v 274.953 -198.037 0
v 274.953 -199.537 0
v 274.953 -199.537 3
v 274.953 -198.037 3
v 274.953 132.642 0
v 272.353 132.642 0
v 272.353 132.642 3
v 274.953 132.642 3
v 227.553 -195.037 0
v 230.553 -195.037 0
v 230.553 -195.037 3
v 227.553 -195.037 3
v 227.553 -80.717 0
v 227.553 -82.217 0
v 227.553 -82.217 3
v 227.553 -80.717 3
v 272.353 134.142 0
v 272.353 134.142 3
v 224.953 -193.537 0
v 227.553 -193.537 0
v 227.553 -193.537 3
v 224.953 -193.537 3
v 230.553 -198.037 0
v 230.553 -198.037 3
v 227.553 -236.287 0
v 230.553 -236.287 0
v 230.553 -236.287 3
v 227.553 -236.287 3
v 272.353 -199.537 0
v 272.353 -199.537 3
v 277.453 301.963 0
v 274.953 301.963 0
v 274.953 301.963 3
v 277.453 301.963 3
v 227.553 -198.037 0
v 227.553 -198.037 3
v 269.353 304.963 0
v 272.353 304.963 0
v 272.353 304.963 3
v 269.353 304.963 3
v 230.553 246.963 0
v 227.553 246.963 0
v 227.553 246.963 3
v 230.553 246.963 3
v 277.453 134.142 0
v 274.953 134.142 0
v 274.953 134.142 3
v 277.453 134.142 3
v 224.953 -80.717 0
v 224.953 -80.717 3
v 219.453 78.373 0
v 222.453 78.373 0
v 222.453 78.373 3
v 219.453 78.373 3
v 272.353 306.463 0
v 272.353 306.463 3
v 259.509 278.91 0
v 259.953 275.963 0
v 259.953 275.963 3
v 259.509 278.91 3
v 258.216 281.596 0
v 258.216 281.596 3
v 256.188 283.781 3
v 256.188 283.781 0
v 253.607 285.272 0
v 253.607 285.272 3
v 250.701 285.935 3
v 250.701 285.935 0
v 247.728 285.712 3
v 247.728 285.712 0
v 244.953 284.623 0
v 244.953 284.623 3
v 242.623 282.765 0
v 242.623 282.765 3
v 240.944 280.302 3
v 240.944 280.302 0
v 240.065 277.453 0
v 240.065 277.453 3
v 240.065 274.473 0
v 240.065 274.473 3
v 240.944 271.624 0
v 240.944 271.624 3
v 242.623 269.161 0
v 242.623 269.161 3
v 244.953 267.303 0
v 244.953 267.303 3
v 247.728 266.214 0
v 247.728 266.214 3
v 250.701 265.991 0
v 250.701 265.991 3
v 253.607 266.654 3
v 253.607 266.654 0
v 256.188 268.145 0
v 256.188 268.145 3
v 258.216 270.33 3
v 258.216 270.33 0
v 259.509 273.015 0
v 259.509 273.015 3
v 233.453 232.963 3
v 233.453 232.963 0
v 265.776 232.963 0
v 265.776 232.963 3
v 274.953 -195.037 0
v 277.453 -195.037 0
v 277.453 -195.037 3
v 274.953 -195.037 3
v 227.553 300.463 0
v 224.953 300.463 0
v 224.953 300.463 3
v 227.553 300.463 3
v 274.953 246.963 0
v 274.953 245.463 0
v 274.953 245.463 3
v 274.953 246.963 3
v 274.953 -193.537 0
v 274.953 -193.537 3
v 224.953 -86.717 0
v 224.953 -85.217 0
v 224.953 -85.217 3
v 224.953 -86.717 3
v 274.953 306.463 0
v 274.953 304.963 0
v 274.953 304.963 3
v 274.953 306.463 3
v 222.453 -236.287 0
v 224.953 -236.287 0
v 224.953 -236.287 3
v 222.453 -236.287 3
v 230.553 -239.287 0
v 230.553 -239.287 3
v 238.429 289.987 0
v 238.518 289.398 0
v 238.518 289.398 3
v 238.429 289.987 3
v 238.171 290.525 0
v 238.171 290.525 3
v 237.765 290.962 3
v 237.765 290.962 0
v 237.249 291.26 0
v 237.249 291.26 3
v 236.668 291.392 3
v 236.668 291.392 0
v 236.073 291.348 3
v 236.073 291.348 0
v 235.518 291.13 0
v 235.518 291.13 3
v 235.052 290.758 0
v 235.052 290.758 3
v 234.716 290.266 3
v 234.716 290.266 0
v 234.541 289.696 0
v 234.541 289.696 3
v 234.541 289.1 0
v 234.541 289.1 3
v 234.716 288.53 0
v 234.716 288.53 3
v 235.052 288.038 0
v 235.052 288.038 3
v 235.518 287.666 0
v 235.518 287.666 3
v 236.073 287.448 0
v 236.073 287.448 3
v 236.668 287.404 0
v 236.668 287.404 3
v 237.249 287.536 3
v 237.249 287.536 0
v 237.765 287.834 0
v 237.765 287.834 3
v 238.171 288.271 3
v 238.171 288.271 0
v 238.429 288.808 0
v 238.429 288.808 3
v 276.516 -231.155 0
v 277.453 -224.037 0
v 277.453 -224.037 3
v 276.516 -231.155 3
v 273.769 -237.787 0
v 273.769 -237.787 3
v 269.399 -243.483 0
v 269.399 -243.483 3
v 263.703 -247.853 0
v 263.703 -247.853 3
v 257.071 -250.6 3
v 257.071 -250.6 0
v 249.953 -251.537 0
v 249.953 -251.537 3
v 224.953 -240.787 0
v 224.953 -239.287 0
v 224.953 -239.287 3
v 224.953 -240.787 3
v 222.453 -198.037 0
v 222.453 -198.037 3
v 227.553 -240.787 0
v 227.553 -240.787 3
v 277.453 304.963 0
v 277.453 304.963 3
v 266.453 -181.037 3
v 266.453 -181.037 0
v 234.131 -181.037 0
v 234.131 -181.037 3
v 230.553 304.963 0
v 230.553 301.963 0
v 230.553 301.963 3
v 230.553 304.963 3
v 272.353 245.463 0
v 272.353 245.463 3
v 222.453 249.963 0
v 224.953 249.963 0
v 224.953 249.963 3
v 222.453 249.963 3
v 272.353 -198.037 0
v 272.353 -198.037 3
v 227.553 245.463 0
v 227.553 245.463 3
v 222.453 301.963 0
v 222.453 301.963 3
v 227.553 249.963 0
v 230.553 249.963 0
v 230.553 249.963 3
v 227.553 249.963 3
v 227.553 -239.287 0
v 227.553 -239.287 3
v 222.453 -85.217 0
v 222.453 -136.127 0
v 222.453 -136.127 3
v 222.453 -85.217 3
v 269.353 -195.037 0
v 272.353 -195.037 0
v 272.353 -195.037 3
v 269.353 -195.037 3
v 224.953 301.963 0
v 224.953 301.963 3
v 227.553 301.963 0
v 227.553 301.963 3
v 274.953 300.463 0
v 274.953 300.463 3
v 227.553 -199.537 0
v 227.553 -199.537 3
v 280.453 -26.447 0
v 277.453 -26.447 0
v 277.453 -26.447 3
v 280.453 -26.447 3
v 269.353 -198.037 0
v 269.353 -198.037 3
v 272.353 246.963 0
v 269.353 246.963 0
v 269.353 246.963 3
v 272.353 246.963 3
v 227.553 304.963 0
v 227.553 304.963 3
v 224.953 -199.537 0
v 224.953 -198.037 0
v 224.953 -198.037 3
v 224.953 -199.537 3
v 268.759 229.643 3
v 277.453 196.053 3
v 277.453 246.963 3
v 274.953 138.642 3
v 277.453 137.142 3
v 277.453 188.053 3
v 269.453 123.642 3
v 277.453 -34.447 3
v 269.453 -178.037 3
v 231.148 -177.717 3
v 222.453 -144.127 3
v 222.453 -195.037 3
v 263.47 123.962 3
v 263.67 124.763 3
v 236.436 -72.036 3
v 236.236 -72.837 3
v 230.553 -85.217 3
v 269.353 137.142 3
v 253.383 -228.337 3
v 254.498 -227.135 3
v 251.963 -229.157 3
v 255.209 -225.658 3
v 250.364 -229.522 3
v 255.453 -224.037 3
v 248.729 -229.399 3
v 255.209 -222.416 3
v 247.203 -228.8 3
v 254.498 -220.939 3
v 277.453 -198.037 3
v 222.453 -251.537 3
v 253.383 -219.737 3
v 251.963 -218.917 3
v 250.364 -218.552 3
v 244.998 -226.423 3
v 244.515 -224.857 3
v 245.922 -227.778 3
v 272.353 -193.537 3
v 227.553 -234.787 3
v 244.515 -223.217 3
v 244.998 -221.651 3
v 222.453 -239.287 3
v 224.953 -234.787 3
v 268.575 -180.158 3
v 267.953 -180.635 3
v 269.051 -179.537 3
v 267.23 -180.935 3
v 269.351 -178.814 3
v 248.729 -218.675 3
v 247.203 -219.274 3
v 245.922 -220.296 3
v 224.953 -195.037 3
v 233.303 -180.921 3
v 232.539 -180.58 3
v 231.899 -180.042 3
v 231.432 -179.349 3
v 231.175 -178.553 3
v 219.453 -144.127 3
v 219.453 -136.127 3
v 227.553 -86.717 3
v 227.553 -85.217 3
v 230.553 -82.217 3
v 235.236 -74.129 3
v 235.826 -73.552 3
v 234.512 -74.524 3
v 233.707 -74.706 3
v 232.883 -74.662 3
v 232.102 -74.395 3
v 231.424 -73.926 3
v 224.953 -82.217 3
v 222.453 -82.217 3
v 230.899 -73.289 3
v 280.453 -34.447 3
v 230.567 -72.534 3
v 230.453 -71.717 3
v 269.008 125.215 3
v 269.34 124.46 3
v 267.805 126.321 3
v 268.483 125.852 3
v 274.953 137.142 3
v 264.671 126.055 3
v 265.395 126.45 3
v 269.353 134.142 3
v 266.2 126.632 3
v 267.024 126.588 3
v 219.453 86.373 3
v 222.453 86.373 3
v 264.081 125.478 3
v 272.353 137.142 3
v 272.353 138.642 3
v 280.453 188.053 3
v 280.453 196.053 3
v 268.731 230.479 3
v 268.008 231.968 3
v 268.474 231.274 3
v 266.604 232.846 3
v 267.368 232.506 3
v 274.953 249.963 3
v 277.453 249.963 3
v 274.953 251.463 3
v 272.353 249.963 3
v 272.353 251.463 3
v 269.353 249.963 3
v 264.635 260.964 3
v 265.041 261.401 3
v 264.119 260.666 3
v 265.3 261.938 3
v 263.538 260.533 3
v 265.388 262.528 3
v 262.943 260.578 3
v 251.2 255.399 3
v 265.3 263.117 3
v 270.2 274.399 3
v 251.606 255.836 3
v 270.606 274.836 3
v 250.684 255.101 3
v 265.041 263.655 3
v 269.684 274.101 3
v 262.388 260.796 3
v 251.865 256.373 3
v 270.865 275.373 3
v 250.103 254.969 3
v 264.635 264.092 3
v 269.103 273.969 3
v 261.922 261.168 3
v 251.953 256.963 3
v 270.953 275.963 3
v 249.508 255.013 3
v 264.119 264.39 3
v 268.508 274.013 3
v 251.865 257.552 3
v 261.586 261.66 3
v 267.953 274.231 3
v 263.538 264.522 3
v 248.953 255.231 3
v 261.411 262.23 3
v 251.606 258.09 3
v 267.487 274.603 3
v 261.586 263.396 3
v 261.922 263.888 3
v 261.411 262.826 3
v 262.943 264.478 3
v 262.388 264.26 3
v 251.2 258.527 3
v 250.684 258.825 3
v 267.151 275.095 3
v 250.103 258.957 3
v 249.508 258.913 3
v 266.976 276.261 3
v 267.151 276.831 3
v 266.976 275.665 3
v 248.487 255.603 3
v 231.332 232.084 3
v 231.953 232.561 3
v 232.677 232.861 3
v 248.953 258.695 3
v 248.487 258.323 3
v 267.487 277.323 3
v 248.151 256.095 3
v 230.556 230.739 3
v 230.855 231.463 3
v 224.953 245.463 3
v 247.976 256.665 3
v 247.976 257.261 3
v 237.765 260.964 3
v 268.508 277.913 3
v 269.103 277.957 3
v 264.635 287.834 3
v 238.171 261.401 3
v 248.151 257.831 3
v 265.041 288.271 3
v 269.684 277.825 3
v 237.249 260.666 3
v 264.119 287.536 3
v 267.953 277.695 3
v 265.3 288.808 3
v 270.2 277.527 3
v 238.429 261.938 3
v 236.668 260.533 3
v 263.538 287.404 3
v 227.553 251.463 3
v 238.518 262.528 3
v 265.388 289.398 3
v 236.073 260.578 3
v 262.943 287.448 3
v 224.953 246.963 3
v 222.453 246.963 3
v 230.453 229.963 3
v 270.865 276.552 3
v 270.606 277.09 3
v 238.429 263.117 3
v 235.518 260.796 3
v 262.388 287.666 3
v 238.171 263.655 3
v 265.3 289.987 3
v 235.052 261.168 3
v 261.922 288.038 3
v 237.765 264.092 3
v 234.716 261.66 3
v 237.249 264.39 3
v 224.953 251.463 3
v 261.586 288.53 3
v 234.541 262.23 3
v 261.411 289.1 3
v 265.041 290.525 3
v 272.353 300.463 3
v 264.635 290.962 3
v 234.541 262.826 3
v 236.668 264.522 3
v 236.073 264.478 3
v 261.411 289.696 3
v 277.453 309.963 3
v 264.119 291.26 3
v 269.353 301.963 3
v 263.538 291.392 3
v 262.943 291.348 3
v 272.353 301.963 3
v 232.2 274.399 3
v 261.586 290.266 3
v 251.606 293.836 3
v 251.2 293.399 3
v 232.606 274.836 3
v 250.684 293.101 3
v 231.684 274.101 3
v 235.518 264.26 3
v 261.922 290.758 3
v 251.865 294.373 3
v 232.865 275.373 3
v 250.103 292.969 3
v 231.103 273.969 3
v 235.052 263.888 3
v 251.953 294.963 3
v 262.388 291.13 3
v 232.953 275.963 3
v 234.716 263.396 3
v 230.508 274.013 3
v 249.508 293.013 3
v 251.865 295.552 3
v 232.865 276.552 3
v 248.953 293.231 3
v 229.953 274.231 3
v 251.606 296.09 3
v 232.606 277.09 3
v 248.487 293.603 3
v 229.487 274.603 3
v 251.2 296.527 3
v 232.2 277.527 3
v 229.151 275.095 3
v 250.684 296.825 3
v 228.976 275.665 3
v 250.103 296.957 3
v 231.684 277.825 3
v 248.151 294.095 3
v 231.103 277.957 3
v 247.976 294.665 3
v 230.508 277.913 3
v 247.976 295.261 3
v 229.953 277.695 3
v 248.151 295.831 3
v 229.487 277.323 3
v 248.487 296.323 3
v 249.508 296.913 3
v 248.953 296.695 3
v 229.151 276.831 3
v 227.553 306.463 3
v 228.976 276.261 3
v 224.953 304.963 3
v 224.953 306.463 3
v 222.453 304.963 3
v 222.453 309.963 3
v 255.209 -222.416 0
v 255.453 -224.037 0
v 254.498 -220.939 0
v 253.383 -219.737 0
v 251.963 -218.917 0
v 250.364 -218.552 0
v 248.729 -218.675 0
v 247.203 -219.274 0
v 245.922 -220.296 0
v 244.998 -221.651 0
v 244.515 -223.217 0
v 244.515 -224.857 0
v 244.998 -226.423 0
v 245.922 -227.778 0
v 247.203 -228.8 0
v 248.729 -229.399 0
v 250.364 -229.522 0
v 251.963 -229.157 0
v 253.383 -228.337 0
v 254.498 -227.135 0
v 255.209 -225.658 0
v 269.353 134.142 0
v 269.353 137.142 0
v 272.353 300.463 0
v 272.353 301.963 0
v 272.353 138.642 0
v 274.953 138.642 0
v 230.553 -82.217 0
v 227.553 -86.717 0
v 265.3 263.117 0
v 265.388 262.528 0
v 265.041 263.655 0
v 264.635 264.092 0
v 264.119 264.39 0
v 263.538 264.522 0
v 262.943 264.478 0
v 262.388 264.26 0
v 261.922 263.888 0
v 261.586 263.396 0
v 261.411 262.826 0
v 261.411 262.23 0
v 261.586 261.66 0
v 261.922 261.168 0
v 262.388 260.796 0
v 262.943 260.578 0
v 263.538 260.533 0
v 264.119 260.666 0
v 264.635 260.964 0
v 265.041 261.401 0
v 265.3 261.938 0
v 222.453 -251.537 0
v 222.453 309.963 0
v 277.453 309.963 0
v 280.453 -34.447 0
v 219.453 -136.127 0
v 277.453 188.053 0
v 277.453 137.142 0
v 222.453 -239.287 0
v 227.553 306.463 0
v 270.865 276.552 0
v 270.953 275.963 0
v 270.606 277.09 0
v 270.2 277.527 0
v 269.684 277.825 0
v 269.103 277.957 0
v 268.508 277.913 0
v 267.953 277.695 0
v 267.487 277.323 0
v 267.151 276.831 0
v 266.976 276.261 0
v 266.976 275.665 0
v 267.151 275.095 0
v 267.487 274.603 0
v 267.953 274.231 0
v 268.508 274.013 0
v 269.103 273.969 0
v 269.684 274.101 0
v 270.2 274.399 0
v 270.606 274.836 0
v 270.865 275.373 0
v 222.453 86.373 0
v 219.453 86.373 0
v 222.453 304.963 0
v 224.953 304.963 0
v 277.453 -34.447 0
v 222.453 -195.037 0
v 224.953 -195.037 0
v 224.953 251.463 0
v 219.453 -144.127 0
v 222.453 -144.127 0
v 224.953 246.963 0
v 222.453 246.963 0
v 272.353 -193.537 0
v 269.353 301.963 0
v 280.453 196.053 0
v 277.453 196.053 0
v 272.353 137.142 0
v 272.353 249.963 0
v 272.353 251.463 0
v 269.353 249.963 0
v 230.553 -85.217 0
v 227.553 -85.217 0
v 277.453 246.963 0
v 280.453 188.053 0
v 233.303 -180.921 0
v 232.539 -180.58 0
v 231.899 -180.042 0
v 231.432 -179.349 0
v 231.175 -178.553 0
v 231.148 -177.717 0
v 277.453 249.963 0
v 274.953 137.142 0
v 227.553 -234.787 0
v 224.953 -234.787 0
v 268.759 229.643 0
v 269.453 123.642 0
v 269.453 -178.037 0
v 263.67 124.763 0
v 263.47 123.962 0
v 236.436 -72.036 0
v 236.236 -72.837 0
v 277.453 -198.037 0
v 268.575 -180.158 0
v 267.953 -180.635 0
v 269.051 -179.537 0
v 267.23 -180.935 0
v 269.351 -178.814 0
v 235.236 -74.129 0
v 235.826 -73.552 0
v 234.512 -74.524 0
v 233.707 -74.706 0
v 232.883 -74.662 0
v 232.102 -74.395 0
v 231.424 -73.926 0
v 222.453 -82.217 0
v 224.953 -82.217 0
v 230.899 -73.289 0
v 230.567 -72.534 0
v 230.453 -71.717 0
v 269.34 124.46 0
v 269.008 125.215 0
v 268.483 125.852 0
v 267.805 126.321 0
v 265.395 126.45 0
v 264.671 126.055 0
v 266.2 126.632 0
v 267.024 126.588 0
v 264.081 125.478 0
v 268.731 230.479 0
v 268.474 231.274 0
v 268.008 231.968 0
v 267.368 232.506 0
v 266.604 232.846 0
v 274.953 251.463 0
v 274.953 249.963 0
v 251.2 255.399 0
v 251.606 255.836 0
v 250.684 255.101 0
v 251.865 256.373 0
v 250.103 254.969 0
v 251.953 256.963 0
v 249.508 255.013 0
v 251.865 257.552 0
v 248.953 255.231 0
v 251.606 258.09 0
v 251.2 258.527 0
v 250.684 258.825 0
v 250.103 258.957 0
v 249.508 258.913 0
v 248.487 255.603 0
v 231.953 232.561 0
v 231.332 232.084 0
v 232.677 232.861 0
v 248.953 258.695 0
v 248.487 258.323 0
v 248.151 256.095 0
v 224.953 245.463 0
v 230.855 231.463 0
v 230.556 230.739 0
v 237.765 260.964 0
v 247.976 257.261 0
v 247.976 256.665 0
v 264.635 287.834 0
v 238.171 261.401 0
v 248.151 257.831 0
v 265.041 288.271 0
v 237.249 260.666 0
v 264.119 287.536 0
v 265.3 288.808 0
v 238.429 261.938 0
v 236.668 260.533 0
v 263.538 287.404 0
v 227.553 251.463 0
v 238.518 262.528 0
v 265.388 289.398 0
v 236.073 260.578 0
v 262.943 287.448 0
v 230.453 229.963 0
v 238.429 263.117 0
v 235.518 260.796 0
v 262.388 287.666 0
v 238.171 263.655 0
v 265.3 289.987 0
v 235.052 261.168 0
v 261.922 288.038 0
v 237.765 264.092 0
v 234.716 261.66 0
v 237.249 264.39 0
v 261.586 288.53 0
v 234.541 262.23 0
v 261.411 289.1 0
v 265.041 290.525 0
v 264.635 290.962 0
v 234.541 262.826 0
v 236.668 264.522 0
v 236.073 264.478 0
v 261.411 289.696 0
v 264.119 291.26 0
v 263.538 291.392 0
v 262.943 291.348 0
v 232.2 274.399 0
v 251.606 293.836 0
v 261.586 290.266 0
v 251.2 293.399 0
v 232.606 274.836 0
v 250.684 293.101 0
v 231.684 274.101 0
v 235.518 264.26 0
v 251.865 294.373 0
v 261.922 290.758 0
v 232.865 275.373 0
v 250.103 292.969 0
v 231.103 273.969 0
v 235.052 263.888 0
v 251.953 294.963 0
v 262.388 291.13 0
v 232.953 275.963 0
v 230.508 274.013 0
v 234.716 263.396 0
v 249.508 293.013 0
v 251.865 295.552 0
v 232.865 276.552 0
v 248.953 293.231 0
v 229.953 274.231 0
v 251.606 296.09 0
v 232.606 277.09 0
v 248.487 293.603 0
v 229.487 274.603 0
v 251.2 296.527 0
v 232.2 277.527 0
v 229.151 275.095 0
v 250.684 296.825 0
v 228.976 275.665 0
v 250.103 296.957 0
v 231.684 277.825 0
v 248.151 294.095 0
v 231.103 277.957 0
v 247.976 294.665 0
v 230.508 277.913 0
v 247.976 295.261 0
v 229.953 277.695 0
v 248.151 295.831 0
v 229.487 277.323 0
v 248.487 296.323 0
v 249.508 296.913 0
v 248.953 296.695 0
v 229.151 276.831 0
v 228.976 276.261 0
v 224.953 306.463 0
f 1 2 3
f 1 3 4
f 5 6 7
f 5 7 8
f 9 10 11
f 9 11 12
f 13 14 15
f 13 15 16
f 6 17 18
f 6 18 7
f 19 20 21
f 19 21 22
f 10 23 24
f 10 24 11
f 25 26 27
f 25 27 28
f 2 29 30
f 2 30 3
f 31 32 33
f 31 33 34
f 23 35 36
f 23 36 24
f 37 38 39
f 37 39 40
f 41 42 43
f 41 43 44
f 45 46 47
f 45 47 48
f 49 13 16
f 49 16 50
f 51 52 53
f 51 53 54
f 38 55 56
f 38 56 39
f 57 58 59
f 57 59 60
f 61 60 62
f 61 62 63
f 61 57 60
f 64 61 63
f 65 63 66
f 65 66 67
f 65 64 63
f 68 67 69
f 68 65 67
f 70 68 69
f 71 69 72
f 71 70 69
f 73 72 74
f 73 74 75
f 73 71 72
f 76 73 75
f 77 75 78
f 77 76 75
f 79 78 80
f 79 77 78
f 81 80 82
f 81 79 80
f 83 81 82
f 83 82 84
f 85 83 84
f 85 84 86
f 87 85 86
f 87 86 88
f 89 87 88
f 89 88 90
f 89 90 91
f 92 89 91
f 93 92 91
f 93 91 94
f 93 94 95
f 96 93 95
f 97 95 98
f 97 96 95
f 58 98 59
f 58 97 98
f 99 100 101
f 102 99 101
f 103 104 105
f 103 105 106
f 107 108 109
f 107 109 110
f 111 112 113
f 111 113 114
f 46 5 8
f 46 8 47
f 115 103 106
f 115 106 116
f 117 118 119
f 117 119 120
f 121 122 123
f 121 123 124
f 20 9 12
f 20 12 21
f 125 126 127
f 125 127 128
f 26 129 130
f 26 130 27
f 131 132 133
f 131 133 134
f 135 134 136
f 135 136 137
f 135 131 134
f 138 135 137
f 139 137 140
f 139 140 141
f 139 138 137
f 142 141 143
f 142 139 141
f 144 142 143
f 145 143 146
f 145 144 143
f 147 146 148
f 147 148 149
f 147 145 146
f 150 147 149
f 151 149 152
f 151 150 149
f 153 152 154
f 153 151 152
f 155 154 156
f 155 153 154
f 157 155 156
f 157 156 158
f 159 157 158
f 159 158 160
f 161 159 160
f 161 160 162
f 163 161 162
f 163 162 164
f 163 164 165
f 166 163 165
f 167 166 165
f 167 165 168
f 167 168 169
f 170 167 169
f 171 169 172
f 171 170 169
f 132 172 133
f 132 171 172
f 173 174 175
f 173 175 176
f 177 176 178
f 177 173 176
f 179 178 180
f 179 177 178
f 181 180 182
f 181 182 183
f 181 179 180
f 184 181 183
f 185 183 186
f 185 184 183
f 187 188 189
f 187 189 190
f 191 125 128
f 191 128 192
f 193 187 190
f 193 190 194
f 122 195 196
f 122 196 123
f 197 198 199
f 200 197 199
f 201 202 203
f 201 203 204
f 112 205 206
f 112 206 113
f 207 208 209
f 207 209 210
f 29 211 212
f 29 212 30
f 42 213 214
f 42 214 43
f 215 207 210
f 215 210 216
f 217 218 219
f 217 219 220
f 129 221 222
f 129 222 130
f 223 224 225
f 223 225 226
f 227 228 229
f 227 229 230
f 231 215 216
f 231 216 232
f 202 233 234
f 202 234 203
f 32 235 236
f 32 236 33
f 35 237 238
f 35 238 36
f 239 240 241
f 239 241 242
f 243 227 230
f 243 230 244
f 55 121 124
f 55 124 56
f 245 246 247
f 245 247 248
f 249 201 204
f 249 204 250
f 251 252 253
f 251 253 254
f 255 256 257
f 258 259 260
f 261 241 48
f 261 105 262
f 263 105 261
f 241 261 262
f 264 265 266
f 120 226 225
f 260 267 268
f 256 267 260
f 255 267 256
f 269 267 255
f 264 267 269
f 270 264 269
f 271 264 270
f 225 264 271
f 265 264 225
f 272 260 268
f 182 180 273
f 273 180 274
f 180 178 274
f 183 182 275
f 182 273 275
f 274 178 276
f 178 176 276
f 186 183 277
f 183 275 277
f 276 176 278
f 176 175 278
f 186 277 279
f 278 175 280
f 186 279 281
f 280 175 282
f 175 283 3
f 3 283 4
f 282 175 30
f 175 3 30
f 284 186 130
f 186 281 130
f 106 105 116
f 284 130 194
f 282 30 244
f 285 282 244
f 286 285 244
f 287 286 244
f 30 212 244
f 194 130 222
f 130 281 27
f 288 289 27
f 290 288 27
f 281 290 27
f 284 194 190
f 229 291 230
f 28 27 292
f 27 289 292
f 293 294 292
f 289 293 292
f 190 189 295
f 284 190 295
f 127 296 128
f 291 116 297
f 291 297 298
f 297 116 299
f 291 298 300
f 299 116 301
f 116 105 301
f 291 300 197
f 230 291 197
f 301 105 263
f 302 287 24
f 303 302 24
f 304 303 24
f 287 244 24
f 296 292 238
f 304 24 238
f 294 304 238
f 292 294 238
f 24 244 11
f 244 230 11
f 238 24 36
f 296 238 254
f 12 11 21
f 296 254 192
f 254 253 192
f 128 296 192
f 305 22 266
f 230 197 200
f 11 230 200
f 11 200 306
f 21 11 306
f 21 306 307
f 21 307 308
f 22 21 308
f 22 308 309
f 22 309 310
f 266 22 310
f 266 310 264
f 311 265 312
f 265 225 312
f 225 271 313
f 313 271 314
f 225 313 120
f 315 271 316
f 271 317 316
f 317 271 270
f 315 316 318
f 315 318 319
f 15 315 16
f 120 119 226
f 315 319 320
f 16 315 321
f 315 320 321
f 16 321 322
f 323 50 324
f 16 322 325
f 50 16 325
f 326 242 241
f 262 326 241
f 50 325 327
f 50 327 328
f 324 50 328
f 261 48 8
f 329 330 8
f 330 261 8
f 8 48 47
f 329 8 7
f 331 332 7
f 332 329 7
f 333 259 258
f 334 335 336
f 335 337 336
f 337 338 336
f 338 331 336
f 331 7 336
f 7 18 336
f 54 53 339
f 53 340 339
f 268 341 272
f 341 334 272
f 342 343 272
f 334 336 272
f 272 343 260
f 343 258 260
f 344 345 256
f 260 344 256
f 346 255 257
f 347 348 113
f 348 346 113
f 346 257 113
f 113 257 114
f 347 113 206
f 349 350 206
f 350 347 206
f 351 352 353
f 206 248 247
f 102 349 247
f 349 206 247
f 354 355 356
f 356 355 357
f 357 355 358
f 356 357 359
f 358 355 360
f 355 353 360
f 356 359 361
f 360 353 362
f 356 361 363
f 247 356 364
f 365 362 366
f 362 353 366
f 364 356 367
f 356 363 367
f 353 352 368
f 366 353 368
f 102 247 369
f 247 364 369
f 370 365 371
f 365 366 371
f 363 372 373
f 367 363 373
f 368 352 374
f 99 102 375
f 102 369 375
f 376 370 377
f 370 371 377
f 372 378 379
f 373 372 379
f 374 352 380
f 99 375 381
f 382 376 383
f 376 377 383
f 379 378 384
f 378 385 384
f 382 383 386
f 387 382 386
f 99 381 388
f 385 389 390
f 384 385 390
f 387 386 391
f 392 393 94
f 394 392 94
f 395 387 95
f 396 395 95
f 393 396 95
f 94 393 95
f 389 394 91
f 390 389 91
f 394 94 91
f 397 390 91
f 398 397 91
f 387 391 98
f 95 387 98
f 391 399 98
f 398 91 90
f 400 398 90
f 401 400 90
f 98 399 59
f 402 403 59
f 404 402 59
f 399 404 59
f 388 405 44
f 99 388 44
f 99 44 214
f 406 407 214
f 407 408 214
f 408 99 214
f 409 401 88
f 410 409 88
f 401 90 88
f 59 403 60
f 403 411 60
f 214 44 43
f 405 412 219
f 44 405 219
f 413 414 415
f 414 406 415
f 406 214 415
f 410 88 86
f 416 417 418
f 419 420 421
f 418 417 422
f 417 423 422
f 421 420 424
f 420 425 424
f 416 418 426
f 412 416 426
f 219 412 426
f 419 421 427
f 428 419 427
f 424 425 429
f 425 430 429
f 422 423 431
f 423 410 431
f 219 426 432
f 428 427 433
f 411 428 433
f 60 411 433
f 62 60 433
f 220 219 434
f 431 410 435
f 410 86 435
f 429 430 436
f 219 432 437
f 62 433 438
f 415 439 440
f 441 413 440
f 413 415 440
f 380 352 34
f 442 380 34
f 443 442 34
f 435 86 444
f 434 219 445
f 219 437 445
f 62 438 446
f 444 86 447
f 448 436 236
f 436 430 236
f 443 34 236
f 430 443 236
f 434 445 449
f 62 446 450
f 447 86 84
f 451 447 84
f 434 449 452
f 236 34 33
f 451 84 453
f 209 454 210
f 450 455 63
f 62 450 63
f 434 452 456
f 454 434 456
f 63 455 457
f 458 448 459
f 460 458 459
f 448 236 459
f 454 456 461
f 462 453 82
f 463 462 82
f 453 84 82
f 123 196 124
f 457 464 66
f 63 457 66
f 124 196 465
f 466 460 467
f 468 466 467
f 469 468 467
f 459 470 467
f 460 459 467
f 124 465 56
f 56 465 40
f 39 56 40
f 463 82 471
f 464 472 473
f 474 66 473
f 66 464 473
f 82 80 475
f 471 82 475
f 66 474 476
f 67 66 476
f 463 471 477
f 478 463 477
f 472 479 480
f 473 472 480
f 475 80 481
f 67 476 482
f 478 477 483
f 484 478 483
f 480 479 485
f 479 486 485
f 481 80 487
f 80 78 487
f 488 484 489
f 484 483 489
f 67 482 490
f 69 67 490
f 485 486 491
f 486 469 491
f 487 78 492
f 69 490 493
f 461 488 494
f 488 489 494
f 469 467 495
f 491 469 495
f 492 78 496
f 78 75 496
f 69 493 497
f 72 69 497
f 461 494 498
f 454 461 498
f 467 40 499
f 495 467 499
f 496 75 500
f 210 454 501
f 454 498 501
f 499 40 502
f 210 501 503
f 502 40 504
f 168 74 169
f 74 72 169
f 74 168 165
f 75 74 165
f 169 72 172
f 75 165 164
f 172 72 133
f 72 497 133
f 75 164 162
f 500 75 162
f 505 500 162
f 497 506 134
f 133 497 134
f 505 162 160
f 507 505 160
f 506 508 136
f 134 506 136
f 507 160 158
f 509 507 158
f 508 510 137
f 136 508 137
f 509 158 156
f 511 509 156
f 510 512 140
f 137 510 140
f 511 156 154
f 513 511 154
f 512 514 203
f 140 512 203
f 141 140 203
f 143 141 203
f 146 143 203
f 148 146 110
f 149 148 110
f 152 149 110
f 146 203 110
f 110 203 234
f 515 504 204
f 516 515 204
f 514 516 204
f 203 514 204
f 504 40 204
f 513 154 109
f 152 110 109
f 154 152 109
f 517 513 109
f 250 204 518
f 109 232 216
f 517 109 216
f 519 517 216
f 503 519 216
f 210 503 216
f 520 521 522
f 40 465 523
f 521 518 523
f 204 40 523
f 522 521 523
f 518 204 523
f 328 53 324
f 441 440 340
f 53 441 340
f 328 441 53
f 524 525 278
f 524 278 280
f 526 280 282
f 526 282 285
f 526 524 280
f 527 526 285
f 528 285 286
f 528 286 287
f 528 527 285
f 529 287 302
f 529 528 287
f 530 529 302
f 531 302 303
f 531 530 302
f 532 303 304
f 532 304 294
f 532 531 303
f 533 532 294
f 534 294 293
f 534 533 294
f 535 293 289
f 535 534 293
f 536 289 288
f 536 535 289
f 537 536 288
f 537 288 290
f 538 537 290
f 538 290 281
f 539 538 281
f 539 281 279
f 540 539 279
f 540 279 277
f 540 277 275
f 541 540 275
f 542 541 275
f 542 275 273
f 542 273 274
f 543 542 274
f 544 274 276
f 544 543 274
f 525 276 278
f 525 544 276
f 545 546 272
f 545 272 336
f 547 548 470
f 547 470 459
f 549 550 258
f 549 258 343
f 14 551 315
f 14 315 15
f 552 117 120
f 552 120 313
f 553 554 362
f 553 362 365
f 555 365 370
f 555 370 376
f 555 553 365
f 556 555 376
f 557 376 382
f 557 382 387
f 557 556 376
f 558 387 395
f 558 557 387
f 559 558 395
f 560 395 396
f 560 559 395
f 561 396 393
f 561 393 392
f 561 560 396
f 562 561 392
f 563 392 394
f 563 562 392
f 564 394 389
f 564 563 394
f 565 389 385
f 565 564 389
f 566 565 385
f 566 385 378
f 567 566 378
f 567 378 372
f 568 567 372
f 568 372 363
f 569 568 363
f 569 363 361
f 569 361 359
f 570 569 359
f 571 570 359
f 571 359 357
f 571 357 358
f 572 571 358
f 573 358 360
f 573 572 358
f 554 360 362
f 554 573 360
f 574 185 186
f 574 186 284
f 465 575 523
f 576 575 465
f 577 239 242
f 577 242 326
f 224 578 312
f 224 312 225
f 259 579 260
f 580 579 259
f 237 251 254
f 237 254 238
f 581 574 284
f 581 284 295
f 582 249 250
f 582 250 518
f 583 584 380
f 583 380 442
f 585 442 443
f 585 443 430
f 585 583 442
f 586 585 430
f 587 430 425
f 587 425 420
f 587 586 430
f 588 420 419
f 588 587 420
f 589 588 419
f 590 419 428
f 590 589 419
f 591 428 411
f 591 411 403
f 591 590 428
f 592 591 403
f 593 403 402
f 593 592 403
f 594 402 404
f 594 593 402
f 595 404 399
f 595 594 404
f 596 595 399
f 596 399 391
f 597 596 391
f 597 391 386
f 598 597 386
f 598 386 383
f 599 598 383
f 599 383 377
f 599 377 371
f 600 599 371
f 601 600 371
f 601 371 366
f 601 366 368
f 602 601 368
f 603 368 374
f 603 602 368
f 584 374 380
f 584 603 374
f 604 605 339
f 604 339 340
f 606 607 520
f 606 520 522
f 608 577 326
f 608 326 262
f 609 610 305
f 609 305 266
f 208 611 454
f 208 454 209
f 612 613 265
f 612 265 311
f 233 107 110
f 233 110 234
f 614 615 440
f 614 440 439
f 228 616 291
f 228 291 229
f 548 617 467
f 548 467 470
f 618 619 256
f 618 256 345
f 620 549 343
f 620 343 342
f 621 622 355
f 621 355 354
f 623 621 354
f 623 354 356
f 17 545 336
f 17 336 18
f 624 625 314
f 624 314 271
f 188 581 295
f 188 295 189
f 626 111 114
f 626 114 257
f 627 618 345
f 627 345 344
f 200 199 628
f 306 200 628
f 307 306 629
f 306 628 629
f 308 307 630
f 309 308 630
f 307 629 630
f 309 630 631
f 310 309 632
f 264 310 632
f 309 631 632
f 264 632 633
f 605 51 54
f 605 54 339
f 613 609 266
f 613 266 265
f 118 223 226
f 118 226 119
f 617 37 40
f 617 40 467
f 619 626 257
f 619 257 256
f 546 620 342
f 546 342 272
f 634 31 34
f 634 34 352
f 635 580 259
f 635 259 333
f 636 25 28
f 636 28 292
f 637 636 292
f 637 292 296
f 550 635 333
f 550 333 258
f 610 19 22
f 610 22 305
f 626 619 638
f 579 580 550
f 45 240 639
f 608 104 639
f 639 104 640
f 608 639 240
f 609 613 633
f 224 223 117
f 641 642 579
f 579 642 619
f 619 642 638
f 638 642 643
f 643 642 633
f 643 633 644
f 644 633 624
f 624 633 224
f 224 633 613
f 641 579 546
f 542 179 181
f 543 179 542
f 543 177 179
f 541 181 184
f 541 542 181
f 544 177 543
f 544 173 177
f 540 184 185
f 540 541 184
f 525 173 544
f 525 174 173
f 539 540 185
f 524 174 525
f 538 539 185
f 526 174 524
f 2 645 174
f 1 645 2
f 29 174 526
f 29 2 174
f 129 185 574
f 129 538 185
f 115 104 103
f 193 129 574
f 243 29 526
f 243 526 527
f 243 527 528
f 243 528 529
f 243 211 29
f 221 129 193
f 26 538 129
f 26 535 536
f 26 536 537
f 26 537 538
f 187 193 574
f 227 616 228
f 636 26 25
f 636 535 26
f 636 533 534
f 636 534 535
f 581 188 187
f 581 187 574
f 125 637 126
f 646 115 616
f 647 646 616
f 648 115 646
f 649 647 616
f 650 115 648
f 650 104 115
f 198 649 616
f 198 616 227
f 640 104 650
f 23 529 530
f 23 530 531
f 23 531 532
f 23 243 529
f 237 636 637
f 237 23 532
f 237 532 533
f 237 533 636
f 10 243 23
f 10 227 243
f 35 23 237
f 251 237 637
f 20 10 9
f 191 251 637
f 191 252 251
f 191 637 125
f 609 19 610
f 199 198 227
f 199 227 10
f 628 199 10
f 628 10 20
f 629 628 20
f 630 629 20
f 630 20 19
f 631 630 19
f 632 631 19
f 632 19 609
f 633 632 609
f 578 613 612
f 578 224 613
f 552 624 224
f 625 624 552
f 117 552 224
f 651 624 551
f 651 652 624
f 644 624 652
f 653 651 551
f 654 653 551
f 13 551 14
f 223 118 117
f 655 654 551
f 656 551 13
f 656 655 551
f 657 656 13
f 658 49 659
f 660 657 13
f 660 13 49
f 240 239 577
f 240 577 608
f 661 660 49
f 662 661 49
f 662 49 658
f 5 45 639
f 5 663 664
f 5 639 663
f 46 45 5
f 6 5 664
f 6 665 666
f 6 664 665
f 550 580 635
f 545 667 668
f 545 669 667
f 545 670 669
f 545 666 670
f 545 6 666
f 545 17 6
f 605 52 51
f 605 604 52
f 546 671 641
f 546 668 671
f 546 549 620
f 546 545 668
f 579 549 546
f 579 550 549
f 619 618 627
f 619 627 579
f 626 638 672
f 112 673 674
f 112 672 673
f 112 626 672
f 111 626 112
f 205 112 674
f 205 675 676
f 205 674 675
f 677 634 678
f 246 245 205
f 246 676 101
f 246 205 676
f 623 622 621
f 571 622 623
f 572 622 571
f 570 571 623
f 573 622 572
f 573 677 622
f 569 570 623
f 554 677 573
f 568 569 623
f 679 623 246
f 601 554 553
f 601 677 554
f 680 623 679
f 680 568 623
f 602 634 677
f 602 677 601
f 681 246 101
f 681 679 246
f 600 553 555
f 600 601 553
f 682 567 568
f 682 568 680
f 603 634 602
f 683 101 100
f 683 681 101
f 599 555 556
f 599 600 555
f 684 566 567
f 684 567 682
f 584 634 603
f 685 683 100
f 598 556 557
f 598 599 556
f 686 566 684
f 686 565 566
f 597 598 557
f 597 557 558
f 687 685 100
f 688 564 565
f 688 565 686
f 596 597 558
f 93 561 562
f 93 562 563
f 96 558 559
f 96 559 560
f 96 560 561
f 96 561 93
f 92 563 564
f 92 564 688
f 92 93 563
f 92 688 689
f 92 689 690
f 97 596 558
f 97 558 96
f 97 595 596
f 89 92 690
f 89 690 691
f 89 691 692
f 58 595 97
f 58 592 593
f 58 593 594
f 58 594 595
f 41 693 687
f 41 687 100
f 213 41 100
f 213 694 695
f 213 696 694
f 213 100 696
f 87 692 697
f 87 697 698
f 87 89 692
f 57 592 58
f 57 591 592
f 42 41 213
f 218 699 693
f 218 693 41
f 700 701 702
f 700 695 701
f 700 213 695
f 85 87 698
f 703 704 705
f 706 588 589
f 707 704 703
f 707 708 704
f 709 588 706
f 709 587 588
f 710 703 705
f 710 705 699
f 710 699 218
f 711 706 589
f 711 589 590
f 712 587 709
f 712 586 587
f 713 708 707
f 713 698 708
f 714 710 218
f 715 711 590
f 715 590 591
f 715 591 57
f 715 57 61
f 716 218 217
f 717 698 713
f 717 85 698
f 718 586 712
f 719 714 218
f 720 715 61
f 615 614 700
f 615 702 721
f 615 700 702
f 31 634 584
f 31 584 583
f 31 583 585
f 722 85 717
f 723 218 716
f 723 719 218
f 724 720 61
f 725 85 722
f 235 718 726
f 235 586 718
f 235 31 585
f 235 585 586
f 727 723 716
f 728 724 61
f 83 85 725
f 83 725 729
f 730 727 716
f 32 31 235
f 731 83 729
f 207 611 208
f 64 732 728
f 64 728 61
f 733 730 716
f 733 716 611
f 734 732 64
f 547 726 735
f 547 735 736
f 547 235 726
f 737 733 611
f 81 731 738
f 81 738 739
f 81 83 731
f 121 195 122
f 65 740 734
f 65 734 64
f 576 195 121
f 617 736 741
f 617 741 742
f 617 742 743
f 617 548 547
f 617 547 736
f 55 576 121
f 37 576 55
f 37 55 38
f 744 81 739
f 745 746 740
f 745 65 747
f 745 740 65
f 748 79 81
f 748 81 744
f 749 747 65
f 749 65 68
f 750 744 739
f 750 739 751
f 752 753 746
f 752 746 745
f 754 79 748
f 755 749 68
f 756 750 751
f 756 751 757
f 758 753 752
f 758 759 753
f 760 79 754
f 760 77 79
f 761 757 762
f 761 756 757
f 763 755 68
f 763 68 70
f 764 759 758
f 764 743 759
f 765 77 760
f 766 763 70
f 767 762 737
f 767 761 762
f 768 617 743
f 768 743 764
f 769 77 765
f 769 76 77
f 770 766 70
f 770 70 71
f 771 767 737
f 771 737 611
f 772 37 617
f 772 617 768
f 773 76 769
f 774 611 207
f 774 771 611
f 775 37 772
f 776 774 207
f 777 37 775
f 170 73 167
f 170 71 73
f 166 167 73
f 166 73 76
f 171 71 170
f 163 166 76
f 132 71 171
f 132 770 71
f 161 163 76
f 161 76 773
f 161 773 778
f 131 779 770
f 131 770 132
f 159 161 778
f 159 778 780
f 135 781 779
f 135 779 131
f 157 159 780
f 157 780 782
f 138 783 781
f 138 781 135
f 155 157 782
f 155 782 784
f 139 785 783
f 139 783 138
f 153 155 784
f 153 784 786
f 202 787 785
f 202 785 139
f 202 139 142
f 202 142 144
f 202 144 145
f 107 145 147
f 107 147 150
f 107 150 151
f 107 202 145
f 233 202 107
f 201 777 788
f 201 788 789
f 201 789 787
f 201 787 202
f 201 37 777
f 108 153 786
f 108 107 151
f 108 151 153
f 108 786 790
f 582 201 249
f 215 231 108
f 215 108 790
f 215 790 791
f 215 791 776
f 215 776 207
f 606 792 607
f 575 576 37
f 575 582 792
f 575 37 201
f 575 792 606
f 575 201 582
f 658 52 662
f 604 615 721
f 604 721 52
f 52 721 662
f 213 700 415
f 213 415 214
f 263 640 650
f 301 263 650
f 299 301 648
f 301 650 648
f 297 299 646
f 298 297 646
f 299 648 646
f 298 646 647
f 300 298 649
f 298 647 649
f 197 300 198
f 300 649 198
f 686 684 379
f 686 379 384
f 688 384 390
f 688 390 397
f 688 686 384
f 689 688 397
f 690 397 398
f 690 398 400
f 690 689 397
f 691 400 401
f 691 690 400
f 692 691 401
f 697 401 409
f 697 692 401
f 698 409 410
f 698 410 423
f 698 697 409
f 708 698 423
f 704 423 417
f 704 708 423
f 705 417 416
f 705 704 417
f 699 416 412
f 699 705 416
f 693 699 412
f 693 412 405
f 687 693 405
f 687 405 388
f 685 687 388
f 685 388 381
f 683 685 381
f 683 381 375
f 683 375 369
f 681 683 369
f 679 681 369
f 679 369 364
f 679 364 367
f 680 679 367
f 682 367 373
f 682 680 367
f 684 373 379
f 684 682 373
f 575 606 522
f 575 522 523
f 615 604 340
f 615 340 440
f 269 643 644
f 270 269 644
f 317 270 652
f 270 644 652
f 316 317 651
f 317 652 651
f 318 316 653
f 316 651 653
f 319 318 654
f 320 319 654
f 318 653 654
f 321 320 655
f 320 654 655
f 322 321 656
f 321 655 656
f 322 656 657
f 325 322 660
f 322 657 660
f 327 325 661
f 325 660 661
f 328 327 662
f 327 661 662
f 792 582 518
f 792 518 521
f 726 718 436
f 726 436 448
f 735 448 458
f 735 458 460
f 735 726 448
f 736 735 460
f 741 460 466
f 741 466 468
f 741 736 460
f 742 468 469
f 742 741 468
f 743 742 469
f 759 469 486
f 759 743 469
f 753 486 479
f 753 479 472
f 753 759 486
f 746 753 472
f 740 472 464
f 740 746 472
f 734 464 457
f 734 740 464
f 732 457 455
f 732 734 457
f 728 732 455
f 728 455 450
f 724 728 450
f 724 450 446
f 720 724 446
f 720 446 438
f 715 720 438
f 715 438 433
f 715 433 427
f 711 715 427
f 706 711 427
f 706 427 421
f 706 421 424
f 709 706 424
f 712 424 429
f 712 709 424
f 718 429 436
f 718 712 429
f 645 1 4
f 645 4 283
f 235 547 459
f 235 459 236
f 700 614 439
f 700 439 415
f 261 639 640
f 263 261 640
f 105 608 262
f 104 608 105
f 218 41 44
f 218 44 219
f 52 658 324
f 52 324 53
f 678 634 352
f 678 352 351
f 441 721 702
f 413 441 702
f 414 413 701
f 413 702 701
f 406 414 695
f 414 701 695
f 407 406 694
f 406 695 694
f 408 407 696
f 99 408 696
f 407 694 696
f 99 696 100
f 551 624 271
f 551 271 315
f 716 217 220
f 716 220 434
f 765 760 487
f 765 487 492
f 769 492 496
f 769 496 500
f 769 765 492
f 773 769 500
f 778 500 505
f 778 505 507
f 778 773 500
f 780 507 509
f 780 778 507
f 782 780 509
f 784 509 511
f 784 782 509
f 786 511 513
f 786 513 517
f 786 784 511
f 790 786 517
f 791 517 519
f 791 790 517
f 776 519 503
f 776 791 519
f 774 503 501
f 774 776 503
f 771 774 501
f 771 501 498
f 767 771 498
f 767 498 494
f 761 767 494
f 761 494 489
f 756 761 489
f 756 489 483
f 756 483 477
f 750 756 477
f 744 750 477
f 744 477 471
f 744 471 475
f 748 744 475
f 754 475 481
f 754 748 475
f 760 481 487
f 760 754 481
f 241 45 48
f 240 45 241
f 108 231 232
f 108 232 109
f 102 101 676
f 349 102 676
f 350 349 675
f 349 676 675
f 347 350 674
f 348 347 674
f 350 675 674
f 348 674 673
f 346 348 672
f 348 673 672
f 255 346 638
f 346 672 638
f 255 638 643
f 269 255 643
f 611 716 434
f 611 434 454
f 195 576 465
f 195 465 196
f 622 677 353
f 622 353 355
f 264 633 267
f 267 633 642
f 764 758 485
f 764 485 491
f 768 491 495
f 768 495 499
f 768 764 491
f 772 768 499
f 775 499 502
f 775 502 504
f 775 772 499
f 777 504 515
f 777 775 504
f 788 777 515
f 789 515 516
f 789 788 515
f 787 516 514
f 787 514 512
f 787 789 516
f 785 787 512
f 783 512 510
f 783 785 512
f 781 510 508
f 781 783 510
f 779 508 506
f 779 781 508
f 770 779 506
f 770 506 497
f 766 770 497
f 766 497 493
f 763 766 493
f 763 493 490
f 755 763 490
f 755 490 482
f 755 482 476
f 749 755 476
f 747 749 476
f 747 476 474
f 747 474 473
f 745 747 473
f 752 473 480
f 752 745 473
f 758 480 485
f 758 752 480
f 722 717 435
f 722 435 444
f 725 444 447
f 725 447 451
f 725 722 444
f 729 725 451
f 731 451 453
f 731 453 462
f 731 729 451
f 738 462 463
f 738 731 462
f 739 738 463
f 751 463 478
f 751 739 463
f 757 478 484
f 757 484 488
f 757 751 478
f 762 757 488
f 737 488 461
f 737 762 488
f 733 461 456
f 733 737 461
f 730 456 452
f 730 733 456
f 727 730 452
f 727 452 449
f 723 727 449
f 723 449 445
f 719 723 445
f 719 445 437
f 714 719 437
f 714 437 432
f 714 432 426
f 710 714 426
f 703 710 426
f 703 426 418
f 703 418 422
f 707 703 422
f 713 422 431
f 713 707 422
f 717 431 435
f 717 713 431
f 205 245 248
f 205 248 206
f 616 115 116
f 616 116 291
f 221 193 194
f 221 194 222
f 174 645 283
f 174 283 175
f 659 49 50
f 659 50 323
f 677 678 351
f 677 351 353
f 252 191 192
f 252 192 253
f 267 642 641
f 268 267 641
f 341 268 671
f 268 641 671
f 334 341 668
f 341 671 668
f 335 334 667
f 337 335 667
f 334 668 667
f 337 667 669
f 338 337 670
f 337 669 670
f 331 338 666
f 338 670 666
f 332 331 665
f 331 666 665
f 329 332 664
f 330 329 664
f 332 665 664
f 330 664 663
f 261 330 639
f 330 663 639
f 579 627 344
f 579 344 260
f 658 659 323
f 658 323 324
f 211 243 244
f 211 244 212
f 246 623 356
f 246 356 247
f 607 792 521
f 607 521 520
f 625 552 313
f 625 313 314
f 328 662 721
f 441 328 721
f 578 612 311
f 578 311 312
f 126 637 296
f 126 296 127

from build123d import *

# Parameters (mm, degrees)
SKETCH_1_R      = 10
SKETCH_1_R_2    = 2
SKETCH_1_R_3    = 5.5
EXTRUDE_1_DEPTH = 3


with BuildPart() as part:
    # 草图1 → 凸台-拉伸1 (new body)
    with BuildSketch(Plane.XY):
        with BuildLine():
            Line((224.953360513, -85.216557036), (224.953360513, -86.716557036))
            Line((224.953360513, -86.716557036), (227.553360513, -86.716557036))
            Line((227.553360513, -86.716557036), (227.553360513, -85.216557036))
            Line((227.553360513, -85.216557036), (230.553360513, -85.216557036))
            Line((230.553360513, -85.216557036), (230.553360513, -82.216557036))
            Line((230.553360513, -82.216557036), (227.553360513, -82.216557036))
            Line((227.553360513, -82.216557036), (227.553360513, -80.716557036))
            Line((227.553360513, -80.716557036), (224.953360513, -80.716557036))
            Line((224.953360513, -80.716557036), (224.953360513, -82.216557036))
            Line((224.953360513, -82.216557036), (222.453360513, -82.216557036))
            Line((222.453360513, -82.216557036), (222.453360513, 78.373187283))
            Line((222.453360513, 78.373187283), (219.453360513, 78.373187283))
            Line((219.453360513, 78.373187283), (219.453360513, 82.373187283))
            Line((219.453360513, 82.373187283), (219.453360513, 86.373187283))
            Line((219.453360513, 86.373187283), (222.453360513, 86.373187283))
            Line((222.453360513, 86.373187283), (222.453360513, 246.962931603))
            Line((222.453360513, 246.962931603), (224.953360513, 246.962931603))
            Line((224.953360513, 246.962931603), (224.953360513, 245.462931603))
            Line((224.953360513, 245.462931603), (227.553360513, 245.462931603))
            Line((227.553360513, 245.462931603), (227.553360513, 246.962931603))
            Line((227.553360513, 246.962931603), (230.553360513, 246.962931603))
            Line((230.553360513, 246.962931603), (230.553360513, 249.962931603))
            Line((230.553360513, 249.962931603), (227.553360513, 249.962931603))
            Line((227.553360513, 249.962931603), (227.553360513, 251.462931603))
            Line((227.553360513, 251.462931603), (224.953360513, 251.462931603))
            Line((224.953360513, 251.462931603), (224.953360513, 249.962931603))
            Line((224.953360513, 249.962931603), (222.453360513, 249.962931603))
            Line((222.453360513, 249.962931603), (222.453360513, 275.962931603))
            Line((222.453360513, 275.962931603), (222.453360513, 301.962931603))
            Line((222.453360513, 301.962931603), (224.953360513, 301.962931603))
            Line((224.953360513, 301.962931603), (224.953360513, 300.462931603))
            Line((224.953360513, 300.462931603), (227.553360513, 300.462931603))
            Line((227.553360513, 300.462931603), (227.553360513, 301.962931603))
            Line((227.553360513, 301.962931603), (230.553360513, 301.962931603))
            Line((230.553360513, 301.962931603), (230.553360513, 304.962931603))
            Line((230.553360513, 304.962931603), (227.553360513, 304.962931603))
            Line((227.553360513, 304.962931603), (227.553360513, 306.462931603))
            Line((227.553360513, 306.462931603), (224.953360513, 306.462931603))
            Line((224.953360513, 306.462931603), (224.953360513, 304.962931603))
            Line((224.953360513, 304.962931603), (222.453360513, 304.962931603))
            Line((222.453360513, 304.962931603), (222.453360513, 309.962931603))
            Line((222.453360513, 309.962931603), (277.453360513, 309.962931603))
            Line((277.453360513, 309.962931603), (277.453360513, 304.962931603))
            Line((277.453360513, 304.962931603), (274.953360513, 304.962931603))
            Line((274.953360513, 304.962931603), (274.953360513, 306.462931603))
            Line((274.953360513, 306.462931603), (272.353360513, 306.462931603))
            Line((272.353360513, 306.462931603), (272.353360513, 304.962931603))
            Line((272.353360513, 304.962931603), (269.353360513, 304.962931603))
            Line((269.353360513, 304.962931603), (269.353360513, 301.962931603))
            Line((269.353360513, 301.962931603), (272.353360513, 301.962931603))
            Line((272.353360513, 301.962931603), (272.353360513, 300.462931603))
            Line((272.353360513, 300.462931603), (274.953360513, 300.462931603))
            Line((274.953360513, 300.462931603), (274.953360513, 301.962931603))
            Line((274.953360513, 301.962931603), (277.453360513, 301.962931603))
            Line((277.453360513, 301.962931603), (277.453360513, 249.962931603))
            Line((277.453360513, 249.962931603), (274.953360513, 249.962931603))
            Line((274.953360513, 249.962931603), (274.953360513, 251.462931603))
            Line((274.953360513, 251.462931603), (272.353360513, 251.462931603))
            Line((272.353360513, 251.462931603), (272.353360513, 249.962931603))
            Line((272.353360513, 249.962931603), (269.353360513, 249.962931603))
            Line((269.353360513, 249.962931603), (269.353360513, 246.962931603))
            Line((269.353360513, 246.962931603), (272.353360513, 246.962931603))
            Line((272.353360513, 246.962931603), (272.353360513, 245.462931603))
            Line((272.353360513, 245.462931603), (274.953360513, 245.462931603))
            Line((274.953360513, 245.462931603), (274.953360513, 246.962931603))
            Line((274.953360513, 246.962931603), (277.453360513, 246.962931603))
            Line((277.453360513, 246.962931603), (277.453360513, 196.052675922))
            Line((277.453360513, 196.052675922), (280.453360513, 196.052675922))
            Line((280.453360513, 196.052675922), (280.453360513, 192.052675922))
            Line((280.453360513, 192.052675922), (280.453360513, 188.052675922))
            Line((280.453360513, 188.052675922), (277.453360513, 188.052675922))
            Line((277.453360513, 188.052675922), (277.453360513, 137.142420241))
            Line((277.453360513, 137.142420241), (274.953360513, 137.142420241))
            Line((274.953360513, 137.142420241), (274.953360513, 138.642420241))
            Line((274.953360513, 138.642420241), (272.353360513, 138.642420241))
            Line((272.353360513, 138.642420241), (272.353360513, 137.142420241))
            Line((272.353360513, 137.142420241), (269.353360513, 137.142420241))
            Line((269.353360513, 137.142420241), (269.353360513, 134.142420241))
            Line((269.353360513, 134.142420241), (272.353360513, 134.142420241))
            Line((272.353360513, 134.142420241), (272.353360513, 132.642420241))
            Line((272.353360513, 132.642420241), (274.953360513, 132.642420241))
            Line((274.953360513, 132.642420241), (274.953360513, 134.142420241))
            Line((274.953360513, 134.142420241), (277.453360513, 134.142420241))
            Line((277.453360513, 134.142420241), (277.453360513, -26.447324078))
            Line((277.453360513, -26.447324078), (280.453360513, -26.447324078))
            Line((280.453360513, -26.447324078), (280.453360513, -30.447324078))
            Line((280.453360513, -30.447324078), (280.453360513, -34.447324078))
            Line((280.453360513, -34.447324078), (277.453360513, -34.447324078))
            Line((277.453360513, -34.447324078), (277.453360513, -195.037068397))
            Line((277.453360513, -195.037068397), (274.953360513, -195.037068397))
            Line((274.953360513, -195.037068397), (274.953360513, -193.537068397))
            Line((274.953360513, -193.537068397), (272.353360513, -193.537068397))
            Line((272.353360513, -193.537068397), (272.353360513, -195.037068397))
            Line((272.353360513, -195.037068397), (269.353360513, -195.037068397))
            Line((269.353360513, -195.037068397), (269.353360513, -198.037068397))
            Line((269.353360513, -198.037068397), (272.353360513, -198.037068397))
            Line((272.353360513, -198.037068397), (272.353360513, -199.537068397))
            Line((272.353360513, -199.537068397), (274.953360513, -199.537068397))
            Line((274.953360513, -199.537068397), (274.953360513, -198.037068397))
            Line((274.953360513, -198.037068397), (277.453360513, -198.037068397))
            Line((277.453360513, -198.037068397), (277.453360513, -224.037068397))
            ThreePointArc((277.453360513, -224.037068397), (269.398796996, -243.48250488), (249.953360513, -251.537068397))
            Line((249.953360513, -251.537068397), (222.453360513, -251.537068397))
            Line((222.453360513, -251.537068397), (222.453360513, -239.287068397))
            Line((222.453360513, -239.287068397), (224.953360513, -239.287068397))
            Line((224.953360513, -239.287068397), (224.953360513, -240.787068397))
            Line((224.953360513, -240.787068397), (227.553360513, -240.787068397))
            Line((227.553360513, -240.787068397), (227.553360513, -239.287068397))
            Line((227.553360513, -239.287068397), (230.553360513, -239.287068397))
            Line((230.553360513, -239.287068397), (230.553360513, -236.287068397))
            Line((230.553360513, -236.287068397), (227.553360513, -236.287068397))
            Line((227.553360513, -236.287068397), (227.553360513, -234.787068397))
            Line((227.553360513, -234.787068397), (224.953360513, -234.787068397))
            Line((224.953360513, -234.787068397), (224.953360513, -236.287068397))
            Line((224.953360513, -236.287068397), (222.453360513, -236.287068397))
            Line((222.453360513, -236.287068397), (222.453360513, -224.037068397))
            Line((222.453360513, -224.037068397), (222.453360513, -198.037068397))
            Line((222.453360513, -198.037068397), (224.953360513, -198.037068397))
            Line((224.953360513, -198.037068397), (224.953360513, -199.537068397))
            Line((224.953360513, -199.537068397), (227.553360513, -199.537068397))
            Line((227.553360513, -199.537068397), (227.553360513, -198.037068397))
            Line((227.553360513, -198.037068397), (230.553360513, -198.037068397))
            Line((230.553360513, -198.037068397), (230.553360513, -195.037068397))
            Line((230.553360513, -195.037068397), (227.553360513, -195.037068397))
            Line((227.553360513, -195.037068397), (227.553360513, -193.537068397))
            Line((227.553360513, -193.537068397), (224.953360513, -193.537068397))
            Line((224.953360513, -193.537068397), (224.953360513, -195.037068397))
            Line((224.953360513, -195.037068397), (222.453360513, -195.037068397))
            Line((222.453360513, -195.037068397), (222.453360513, -144.126812717))
            Line((222.453360513, -144.126812717), (219.453360513, -144.126812717))
            Line((219.453360513, -144.126812717), (219.453360513, -140.126812717))
            Line((219.453360513, -140.126812717), (219.453360513, -136.126812717))
            Line((219.453360513, -136.126812717), (222.453360513, -136.126812717))
            Line((222.453360513, -136.126812717), (222.453360513, -85.216557036))
            Line((222.453360513, -85.216557036), (224.953360513, -85.216557036))
        make_face()
        with Locations((249.953360513, 275.962931603)):
            Circle(SKETCH_1_R, mode=Mode.SUBTRACT)
        with Locations((230.953360513, 275.962931603)):
            Circle(SKETCH_1_R_2, mode=Mode.SUBTRACT)
        with Locations((236.518331671, 289.397960445)):
            Circle(SKETCH_1_R_2, mode=Mode.SUBTRACT)
        with Locations((249.953360513, 294.962931603)):
            Circle(SKETCH_1_R_2, mode=Mode.SUBTRACT)
        with Locations((263.388389356, 289.397960445)):
            Circle(SKETCH_1_R_2, mode=Mode.SUBTRACT)
        with Locations((268.953360513, 275.962931603)):
            Circle(SKETCH_1_R_2, mode=Mode.SUBTRACT)
        with Locations((263.388389356, 262.52790276)):
            Circle(SKETCH_1_R_2, mode=Mode.SUBTRACT)
        with Locations((249.953360513, 256.962931603)):
            Circle(SKETCH_1_R_2, mode=Mode.SUBTRACT)
        with Locations((236.518331671, 262.52790276)):
            Circle(SKETCH_1_R_2, mode=Mode.SUBTRACT)
        with Locations((249.953360513, -224.037068397)):
            Circle(SKETCH_1_R_3, mode=Mode.SUBTRACT)
        with BuildLine():
            Line((233.453360513, 232.962931603), (265.776162867, 232.962931603))
            ThreePointArc((265.776162867, 232.962931603), (268.007619579, 231.968075224), (268.759090329, 229.643332232))
            Line((268.759090329, 229.643332232), (236.436287975, -72.036156407))
            ThreePointArc((236.436287975, -72.036156407), (233.293332993, -74.712285861), (230.453360513, -71.716557036))
            Line((230.453360513, -71.716557036), (230.453360513, 229.962931603))
            ThreePointArc((230.453360513, 229.962931603), (231.33204017, 232.084251946), (233.453360513, 232.962931603))
        make_face(mode=Mode.SUBTRACT)
        with BuildLine():
            Line((269.453360513, 123.642420241), (269.453360513, -178.037068397))
            ThreePointArc((269.453360513, -178.037068397), (268.574680857, -180.158388741), (266.453360513, -181.037068397))
            Line((266.453360513, -181.037068397), (234.130558159, -181.037068397))
            ThreePointArc((234.130558159, -181.037068397), (231.899101447, -180.042212019), (231.147630697, -177.717469026))
            Line((231.147630697, -177.717469026), (263.470433052, 123.962019612))
            ThreePointArc((263.470433052, 123.962019612), (266.613388034, 126.638149066), (269.453360513, 123.642420241))
        make_face(mode=Mode.SUBTRACT)
    extrude(amount=EXTRUDE_1_DEPTH)


solid = part.part
